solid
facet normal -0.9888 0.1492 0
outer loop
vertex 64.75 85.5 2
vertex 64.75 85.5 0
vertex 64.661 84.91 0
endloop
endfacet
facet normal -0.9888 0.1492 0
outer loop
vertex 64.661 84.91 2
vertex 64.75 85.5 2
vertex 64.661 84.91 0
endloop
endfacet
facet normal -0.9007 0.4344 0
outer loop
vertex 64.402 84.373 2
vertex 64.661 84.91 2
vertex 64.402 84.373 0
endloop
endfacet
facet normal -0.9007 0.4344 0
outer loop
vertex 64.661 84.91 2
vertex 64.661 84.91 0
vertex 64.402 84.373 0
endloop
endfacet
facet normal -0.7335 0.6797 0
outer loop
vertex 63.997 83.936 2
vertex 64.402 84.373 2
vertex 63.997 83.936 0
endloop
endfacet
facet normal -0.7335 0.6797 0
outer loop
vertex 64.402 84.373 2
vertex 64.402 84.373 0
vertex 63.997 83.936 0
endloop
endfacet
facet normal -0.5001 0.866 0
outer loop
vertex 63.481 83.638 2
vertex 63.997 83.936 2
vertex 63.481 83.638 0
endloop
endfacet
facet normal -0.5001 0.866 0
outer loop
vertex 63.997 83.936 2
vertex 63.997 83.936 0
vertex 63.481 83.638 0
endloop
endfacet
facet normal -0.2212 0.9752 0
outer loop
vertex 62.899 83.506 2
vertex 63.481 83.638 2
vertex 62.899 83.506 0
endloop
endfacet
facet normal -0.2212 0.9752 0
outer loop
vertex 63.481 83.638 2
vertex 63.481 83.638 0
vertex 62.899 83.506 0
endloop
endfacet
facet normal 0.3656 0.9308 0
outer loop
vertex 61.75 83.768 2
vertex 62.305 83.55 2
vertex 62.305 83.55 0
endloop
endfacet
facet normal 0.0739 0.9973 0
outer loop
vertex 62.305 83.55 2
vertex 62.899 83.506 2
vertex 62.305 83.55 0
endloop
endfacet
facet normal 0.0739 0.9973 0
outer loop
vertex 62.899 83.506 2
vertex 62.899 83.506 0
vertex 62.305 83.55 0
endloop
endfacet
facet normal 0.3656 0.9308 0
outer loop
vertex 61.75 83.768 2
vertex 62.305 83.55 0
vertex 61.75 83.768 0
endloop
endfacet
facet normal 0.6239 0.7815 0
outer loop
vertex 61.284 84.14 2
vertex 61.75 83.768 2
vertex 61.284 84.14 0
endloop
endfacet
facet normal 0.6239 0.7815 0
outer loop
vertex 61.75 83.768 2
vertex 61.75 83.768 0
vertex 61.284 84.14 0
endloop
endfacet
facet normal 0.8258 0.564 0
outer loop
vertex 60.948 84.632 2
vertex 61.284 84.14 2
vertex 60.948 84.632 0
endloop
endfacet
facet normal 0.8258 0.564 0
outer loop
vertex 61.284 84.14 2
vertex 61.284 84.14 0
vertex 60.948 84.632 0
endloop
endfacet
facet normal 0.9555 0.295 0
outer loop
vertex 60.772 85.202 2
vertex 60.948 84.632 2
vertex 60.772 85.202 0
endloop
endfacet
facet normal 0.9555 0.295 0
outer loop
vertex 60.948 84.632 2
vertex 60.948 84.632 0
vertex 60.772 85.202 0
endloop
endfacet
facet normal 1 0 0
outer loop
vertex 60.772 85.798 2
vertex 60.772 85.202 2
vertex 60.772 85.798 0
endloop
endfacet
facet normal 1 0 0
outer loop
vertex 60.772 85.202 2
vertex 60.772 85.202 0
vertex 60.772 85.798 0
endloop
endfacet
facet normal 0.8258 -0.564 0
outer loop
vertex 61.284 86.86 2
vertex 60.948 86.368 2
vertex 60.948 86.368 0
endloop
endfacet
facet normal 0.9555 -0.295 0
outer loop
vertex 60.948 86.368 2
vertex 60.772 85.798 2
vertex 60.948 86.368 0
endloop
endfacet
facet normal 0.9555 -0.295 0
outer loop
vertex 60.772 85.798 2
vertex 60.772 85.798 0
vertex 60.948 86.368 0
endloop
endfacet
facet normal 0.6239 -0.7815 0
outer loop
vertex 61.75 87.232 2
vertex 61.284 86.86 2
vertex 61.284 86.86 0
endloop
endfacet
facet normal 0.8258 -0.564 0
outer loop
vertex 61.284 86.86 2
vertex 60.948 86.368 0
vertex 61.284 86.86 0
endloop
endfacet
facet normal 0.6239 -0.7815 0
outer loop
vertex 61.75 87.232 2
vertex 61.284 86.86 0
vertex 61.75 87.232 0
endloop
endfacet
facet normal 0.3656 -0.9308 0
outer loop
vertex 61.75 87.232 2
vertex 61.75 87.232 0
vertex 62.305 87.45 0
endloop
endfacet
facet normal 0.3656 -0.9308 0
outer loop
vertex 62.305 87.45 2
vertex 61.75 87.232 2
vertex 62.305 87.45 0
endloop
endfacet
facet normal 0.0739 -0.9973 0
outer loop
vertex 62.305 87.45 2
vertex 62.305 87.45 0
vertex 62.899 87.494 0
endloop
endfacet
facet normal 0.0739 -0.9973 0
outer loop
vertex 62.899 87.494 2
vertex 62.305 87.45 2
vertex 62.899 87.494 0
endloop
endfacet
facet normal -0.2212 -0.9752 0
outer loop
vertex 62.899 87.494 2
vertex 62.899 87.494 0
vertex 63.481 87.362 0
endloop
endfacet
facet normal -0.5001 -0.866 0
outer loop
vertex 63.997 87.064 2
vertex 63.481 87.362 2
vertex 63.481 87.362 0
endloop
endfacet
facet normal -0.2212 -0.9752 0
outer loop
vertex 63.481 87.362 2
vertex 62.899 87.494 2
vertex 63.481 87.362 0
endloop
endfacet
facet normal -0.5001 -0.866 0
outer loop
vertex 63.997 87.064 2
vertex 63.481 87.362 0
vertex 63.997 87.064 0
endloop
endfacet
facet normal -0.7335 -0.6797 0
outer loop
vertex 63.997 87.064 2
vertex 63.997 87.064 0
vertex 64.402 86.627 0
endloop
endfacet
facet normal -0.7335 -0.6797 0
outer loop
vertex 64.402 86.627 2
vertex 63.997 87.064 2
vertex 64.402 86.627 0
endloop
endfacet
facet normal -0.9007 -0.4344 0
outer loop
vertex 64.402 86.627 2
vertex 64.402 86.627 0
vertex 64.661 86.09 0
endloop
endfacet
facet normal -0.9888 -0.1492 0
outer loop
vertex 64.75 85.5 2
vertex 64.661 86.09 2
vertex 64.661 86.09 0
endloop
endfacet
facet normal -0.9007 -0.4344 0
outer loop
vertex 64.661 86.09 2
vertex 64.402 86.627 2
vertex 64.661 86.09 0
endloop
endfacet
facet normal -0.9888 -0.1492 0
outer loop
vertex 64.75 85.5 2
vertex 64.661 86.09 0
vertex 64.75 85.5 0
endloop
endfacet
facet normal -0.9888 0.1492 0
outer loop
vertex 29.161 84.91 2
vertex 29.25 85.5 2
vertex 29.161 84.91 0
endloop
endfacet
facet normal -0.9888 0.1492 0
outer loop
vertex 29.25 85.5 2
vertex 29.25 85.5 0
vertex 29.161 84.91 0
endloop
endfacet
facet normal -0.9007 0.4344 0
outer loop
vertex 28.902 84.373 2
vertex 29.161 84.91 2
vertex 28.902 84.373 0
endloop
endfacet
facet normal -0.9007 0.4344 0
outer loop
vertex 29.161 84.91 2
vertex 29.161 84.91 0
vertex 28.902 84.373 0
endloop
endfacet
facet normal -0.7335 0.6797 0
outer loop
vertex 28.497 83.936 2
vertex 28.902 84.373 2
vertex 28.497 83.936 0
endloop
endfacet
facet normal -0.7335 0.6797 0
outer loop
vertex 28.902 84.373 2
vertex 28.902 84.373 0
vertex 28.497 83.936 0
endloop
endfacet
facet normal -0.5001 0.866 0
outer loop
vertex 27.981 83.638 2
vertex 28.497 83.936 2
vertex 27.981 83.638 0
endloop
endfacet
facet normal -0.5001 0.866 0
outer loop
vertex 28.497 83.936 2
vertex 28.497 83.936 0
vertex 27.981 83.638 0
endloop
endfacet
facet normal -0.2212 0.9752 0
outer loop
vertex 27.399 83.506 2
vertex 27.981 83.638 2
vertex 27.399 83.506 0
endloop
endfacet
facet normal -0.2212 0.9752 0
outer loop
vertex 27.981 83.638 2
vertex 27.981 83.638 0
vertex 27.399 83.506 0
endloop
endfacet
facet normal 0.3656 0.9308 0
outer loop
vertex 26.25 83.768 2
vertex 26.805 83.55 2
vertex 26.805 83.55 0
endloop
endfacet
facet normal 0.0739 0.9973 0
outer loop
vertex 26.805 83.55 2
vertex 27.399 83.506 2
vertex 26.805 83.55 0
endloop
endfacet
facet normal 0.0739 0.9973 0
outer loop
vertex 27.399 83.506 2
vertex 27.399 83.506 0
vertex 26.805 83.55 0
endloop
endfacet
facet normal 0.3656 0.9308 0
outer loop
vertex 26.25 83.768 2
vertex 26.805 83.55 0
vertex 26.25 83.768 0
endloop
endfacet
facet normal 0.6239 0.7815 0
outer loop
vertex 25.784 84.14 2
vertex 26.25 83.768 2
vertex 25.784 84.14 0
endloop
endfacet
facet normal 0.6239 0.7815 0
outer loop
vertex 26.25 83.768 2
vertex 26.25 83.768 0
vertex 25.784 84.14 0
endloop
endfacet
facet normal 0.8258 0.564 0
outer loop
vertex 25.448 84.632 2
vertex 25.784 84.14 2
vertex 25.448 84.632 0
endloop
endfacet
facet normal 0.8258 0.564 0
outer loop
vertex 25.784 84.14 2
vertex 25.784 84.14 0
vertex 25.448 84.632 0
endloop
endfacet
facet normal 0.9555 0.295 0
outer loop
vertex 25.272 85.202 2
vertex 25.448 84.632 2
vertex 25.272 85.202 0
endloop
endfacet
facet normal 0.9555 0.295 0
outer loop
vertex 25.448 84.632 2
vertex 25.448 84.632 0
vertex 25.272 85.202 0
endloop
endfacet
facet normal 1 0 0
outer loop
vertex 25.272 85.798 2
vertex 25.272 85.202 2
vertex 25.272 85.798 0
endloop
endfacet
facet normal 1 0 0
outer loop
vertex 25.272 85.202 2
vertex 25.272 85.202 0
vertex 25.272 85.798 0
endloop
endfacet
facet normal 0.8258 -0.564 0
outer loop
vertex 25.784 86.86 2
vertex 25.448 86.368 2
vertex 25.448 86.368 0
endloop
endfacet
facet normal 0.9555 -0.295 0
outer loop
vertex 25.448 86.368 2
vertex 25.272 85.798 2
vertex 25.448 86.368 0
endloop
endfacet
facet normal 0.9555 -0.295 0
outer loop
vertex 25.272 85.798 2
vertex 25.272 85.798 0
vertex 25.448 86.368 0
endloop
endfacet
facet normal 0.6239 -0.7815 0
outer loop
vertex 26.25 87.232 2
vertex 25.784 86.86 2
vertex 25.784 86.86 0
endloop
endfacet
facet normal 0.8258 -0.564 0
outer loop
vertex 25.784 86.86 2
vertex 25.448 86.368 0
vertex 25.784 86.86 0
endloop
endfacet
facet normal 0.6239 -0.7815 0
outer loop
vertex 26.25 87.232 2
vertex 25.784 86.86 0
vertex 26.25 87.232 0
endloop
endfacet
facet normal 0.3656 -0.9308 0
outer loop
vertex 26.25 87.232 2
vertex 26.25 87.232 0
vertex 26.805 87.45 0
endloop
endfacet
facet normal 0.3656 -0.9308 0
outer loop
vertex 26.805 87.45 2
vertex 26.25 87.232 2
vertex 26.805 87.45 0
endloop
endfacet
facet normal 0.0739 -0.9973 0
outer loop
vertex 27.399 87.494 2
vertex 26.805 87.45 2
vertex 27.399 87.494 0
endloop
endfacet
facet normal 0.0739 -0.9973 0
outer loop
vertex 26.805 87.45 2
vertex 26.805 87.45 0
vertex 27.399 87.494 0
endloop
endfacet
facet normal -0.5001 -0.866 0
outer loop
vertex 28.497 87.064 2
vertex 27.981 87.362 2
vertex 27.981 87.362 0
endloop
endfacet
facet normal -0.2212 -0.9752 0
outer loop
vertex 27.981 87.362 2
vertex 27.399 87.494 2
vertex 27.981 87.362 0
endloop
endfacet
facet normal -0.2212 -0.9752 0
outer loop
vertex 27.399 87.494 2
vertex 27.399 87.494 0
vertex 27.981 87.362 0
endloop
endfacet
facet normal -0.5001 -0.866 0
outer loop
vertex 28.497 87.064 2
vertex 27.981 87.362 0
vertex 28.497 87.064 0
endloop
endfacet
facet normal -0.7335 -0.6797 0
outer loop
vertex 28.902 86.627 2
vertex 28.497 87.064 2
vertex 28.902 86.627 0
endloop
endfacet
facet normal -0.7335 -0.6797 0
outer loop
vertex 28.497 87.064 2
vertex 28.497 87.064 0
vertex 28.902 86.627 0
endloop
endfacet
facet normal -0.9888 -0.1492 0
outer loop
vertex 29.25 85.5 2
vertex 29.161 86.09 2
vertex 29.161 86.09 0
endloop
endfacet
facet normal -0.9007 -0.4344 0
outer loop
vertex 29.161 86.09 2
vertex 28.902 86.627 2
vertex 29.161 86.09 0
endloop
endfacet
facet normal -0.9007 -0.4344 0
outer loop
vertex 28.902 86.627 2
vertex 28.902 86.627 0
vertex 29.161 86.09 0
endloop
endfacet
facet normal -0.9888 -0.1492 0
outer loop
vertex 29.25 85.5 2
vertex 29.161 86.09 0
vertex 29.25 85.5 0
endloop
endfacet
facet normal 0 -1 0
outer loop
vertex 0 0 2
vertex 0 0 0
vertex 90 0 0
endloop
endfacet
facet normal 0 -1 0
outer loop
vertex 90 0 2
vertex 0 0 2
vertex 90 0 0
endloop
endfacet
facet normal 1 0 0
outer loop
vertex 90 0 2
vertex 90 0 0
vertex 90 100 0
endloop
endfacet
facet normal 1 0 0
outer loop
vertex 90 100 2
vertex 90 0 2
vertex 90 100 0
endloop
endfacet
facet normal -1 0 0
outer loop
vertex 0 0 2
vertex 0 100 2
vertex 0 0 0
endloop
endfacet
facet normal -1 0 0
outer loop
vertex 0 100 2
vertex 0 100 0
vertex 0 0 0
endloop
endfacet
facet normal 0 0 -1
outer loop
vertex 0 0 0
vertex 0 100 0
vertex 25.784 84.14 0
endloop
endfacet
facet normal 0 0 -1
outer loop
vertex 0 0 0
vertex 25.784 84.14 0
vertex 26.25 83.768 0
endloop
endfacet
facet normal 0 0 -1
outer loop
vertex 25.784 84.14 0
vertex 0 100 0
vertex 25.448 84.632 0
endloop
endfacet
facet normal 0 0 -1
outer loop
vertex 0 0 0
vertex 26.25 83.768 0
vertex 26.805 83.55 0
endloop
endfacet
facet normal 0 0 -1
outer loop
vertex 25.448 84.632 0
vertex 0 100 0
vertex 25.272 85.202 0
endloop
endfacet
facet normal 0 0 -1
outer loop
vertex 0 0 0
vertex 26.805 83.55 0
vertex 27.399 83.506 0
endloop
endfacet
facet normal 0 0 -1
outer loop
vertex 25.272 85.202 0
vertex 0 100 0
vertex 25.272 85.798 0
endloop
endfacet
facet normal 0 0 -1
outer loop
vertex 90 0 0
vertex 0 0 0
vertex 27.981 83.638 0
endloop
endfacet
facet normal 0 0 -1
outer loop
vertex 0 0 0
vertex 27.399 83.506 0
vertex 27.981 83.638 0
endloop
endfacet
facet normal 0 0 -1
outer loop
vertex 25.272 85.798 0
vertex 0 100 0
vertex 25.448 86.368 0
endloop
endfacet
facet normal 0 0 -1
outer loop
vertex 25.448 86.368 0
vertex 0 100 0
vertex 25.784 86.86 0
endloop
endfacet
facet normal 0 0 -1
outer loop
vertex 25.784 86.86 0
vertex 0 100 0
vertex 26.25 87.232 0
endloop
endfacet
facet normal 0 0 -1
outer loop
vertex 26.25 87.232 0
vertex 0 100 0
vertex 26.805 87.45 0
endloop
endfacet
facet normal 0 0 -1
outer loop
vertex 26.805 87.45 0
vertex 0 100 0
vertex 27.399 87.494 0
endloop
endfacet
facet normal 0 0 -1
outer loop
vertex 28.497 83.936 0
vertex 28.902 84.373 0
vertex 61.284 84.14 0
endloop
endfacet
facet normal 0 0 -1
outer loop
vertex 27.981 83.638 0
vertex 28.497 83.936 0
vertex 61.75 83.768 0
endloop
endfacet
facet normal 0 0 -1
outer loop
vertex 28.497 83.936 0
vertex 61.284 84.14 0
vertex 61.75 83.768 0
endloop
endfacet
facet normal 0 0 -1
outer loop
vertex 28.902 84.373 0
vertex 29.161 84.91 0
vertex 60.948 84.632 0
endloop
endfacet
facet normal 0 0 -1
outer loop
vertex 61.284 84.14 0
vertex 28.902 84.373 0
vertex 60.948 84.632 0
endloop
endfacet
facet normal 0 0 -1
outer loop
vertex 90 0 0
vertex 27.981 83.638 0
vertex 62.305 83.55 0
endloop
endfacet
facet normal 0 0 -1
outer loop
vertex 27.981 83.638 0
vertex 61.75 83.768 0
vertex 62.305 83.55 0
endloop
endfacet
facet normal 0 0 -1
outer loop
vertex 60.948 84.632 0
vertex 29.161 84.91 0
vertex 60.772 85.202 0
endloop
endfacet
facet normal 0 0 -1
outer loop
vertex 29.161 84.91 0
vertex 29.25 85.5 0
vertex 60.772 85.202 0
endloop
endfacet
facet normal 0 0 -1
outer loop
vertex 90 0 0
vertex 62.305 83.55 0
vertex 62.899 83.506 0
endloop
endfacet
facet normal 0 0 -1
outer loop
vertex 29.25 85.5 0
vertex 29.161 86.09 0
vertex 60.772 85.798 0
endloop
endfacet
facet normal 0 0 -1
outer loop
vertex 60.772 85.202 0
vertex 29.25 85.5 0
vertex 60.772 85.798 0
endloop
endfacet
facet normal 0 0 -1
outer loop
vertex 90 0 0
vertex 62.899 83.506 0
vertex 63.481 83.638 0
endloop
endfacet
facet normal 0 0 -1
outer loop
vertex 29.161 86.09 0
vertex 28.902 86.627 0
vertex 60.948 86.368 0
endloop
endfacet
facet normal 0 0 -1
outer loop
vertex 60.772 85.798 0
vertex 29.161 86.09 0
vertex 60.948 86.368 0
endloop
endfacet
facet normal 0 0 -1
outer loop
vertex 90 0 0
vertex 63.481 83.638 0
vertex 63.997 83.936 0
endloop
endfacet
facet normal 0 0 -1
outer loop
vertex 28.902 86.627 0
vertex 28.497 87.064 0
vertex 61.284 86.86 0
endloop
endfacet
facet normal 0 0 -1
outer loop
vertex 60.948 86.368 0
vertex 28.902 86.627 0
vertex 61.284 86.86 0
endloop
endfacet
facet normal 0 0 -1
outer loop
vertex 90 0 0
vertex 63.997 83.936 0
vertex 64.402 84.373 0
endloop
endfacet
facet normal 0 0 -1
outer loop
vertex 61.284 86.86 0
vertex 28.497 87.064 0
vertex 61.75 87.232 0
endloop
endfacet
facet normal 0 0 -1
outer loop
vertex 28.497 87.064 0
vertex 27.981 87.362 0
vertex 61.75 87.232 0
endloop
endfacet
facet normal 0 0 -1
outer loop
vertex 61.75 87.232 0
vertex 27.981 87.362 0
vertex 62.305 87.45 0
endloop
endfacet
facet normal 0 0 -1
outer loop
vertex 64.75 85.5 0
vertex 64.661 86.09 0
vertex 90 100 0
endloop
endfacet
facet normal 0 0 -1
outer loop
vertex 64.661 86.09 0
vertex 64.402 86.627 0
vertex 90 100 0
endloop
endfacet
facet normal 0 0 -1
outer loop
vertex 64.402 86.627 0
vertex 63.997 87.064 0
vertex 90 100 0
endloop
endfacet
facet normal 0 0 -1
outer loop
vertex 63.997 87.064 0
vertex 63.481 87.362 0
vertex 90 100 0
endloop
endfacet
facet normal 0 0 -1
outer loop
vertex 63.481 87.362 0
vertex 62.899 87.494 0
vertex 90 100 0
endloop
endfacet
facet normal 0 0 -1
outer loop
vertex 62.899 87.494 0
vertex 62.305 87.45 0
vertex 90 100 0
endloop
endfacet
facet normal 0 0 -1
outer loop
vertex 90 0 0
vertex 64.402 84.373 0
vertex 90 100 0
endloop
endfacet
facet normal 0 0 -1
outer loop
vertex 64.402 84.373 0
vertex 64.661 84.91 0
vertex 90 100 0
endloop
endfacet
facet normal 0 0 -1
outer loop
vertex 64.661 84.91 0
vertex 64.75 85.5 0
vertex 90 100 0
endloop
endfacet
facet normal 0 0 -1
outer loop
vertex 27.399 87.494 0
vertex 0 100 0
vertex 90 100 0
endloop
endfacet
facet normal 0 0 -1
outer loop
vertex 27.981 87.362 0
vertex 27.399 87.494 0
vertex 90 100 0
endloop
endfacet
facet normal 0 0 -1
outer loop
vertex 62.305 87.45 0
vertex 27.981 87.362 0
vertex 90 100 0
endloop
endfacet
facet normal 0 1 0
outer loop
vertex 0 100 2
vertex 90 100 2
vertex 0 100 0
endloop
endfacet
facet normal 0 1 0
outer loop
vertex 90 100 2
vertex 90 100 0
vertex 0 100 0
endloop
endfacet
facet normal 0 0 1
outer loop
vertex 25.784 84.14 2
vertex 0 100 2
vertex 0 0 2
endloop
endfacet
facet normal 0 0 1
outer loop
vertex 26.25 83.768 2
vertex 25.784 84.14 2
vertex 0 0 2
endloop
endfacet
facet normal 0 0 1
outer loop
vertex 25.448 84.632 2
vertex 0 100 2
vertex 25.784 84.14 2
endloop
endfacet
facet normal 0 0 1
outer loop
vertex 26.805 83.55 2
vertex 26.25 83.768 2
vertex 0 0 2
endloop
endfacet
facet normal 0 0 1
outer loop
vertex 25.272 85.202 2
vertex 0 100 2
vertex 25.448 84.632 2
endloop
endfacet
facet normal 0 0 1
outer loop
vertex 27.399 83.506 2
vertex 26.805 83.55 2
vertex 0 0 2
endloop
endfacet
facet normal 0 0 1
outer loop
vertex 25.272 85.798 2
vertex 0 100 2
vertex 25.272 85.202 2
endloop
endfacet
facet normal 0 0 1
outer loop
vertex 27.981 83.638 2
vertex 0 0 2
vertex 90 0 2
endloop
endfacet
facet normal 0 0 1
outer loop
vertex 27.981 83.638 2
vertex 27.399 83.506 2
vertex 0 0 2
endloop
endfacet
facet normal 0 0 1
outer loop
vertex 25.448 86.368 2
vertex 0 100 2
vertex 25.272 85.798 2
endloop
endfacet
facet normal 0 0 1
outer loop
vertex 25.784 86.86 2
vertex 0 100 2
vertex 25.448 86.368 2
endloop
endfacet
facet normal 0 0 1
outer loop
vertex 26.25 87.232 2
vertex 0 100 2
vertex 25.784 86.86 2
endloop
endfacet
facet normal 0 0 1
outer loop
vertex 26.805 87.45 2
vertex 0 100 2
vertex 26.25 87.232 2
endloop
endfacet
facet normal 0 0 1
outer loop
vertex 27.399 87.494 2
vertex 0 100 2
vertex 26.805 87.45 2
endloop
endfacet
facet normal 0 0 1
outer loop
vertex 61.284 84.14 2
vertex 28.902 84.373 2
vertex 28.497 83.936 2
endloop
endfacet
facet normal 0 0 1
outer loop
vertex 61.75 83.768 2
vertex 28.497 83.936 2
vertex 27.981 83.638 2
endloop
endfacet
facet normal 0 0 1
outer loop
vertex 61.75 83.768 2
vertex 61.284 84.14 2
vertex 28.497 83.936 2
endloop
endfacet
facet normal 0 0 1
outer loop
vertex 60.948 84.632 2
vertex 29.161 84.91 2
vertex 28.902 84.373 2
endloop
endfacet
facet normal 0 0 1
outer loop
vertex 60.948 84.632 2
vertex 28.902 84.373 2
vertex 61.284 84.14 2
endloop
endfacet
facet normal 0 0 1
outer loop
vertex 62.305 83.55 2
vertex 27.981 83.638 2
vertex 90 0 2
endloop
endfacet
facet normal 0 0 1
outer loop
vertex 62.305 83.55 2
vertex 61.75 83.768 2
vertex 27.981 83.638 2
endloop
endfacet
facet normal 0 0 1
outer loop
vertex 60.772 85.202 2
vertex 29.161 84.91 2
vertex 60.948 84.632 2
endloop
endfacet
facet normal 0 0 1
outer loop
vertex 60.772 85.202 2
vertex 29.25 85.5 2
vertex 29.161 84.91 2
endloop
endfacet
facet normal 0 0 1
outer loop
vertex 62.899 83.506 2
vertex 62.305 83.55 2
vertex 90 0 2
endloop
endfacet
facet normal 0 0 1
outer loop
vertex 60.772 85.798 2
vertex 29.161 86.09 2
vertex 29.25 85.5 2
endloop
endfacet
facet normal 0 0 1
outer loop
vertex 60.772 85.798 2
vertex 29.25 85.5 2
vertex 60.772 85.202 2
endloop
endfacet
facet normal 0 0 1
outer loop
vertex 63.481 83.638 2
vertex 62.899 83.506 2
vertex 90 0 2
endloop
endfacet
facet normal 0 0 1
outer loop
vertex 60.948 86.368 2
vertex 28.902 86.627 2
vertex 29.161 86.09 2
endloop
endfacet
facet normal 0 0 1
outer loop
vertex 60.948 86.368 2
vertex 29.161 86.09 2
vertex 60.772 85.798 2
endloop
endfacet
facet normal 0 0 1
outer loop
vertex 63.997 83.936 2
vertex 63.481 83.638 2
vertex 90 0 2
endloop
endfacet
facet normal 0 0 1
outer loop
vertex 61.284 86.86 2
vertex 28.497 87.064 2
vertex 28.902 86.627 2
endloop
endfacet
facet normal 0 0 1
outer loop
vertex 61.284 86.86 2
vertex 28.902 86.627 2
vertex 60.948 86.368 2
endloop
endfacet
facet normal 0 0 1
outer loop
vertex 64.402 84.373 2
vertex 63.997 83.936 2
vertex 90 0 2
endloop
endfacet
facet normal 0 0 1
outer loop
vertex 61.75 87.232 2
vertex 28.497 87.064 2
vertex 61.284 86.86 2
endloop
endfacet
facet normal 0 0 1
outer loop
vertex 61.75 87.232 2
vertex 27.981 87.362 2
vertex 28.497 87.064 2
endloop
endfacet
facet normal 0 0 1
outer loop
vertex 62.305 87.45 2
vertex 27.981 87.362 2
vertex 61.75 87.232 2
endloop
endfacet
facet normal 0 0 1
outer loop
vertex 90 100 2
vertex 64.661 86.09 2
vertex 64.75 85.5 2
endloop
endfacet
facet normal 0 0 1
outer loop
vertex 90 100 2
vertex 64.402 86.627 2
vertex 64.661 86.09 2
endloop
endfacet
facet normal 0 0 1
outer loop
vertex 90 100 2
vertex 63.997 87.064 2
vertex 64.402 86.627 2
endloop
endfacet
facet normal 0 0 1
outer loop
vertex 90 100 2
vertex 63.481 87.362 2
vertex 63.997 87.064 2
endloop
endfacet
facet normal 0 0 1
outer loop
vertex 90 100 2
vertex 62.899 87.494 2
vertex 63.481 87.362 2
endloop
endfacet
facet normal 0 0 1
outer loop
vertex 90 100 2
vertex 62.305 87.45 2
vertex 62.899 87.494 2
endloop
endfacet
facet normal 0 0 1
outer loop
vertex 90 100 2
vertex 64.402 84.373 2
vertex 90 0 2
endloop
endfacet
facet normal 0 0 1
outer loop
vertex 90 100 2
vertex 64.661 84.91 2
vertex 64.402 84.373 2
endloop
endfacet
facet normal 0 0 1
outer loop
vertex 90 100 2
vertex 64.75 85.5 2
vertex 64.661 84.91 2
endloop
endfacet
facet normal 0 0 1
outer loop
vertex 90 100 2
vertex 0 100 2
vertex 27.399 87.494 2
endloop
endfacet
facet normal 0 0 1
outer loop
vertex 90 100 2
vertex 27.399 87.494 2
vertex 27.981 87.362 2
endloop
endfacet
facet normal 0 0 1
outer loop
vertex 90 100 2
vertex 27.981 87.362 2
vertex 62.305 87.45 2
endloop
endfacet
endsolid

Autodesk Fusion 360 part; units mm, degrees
sketch "Sketch1" plane through (0, 0, 0) normal (0, 0, 1) x (1, 0, 0)
  line L0 (0, 0) -> (90, 0)
  line L1 (90, 0) -> (90, 100)
  line L2 (90, 100) -> (0, 100)
  line L3 (0, 100) -> (0, 0)
  line L4 (45, 100) -> (45, 0)
  line L5 (90, 50) -> (0, 50)
  line L6 (45, 85.5) -> (49, 85.5) construction
  circle A0 centre (45, 85.5) radius 3 construction
  line L7 (45, 85.5) -> (27.25, 85.5) construction
  line L8 (45, 85.5) -> (62.75, 85.5) construction
  circle A1 centre (27.25, 85.5) radius 2
  circle A2 centre (62.75, 85.5) radius 2
  dimension "d1" = 90
  dimension "d2" = 100
  dimension "d3" = 14.5
  dimension "d4" = 6
  dimension "d5" = 17.75
  dimension "d6" = 4
extrude "Extrude1" add sketch "Sketch1" along normal blind 2
